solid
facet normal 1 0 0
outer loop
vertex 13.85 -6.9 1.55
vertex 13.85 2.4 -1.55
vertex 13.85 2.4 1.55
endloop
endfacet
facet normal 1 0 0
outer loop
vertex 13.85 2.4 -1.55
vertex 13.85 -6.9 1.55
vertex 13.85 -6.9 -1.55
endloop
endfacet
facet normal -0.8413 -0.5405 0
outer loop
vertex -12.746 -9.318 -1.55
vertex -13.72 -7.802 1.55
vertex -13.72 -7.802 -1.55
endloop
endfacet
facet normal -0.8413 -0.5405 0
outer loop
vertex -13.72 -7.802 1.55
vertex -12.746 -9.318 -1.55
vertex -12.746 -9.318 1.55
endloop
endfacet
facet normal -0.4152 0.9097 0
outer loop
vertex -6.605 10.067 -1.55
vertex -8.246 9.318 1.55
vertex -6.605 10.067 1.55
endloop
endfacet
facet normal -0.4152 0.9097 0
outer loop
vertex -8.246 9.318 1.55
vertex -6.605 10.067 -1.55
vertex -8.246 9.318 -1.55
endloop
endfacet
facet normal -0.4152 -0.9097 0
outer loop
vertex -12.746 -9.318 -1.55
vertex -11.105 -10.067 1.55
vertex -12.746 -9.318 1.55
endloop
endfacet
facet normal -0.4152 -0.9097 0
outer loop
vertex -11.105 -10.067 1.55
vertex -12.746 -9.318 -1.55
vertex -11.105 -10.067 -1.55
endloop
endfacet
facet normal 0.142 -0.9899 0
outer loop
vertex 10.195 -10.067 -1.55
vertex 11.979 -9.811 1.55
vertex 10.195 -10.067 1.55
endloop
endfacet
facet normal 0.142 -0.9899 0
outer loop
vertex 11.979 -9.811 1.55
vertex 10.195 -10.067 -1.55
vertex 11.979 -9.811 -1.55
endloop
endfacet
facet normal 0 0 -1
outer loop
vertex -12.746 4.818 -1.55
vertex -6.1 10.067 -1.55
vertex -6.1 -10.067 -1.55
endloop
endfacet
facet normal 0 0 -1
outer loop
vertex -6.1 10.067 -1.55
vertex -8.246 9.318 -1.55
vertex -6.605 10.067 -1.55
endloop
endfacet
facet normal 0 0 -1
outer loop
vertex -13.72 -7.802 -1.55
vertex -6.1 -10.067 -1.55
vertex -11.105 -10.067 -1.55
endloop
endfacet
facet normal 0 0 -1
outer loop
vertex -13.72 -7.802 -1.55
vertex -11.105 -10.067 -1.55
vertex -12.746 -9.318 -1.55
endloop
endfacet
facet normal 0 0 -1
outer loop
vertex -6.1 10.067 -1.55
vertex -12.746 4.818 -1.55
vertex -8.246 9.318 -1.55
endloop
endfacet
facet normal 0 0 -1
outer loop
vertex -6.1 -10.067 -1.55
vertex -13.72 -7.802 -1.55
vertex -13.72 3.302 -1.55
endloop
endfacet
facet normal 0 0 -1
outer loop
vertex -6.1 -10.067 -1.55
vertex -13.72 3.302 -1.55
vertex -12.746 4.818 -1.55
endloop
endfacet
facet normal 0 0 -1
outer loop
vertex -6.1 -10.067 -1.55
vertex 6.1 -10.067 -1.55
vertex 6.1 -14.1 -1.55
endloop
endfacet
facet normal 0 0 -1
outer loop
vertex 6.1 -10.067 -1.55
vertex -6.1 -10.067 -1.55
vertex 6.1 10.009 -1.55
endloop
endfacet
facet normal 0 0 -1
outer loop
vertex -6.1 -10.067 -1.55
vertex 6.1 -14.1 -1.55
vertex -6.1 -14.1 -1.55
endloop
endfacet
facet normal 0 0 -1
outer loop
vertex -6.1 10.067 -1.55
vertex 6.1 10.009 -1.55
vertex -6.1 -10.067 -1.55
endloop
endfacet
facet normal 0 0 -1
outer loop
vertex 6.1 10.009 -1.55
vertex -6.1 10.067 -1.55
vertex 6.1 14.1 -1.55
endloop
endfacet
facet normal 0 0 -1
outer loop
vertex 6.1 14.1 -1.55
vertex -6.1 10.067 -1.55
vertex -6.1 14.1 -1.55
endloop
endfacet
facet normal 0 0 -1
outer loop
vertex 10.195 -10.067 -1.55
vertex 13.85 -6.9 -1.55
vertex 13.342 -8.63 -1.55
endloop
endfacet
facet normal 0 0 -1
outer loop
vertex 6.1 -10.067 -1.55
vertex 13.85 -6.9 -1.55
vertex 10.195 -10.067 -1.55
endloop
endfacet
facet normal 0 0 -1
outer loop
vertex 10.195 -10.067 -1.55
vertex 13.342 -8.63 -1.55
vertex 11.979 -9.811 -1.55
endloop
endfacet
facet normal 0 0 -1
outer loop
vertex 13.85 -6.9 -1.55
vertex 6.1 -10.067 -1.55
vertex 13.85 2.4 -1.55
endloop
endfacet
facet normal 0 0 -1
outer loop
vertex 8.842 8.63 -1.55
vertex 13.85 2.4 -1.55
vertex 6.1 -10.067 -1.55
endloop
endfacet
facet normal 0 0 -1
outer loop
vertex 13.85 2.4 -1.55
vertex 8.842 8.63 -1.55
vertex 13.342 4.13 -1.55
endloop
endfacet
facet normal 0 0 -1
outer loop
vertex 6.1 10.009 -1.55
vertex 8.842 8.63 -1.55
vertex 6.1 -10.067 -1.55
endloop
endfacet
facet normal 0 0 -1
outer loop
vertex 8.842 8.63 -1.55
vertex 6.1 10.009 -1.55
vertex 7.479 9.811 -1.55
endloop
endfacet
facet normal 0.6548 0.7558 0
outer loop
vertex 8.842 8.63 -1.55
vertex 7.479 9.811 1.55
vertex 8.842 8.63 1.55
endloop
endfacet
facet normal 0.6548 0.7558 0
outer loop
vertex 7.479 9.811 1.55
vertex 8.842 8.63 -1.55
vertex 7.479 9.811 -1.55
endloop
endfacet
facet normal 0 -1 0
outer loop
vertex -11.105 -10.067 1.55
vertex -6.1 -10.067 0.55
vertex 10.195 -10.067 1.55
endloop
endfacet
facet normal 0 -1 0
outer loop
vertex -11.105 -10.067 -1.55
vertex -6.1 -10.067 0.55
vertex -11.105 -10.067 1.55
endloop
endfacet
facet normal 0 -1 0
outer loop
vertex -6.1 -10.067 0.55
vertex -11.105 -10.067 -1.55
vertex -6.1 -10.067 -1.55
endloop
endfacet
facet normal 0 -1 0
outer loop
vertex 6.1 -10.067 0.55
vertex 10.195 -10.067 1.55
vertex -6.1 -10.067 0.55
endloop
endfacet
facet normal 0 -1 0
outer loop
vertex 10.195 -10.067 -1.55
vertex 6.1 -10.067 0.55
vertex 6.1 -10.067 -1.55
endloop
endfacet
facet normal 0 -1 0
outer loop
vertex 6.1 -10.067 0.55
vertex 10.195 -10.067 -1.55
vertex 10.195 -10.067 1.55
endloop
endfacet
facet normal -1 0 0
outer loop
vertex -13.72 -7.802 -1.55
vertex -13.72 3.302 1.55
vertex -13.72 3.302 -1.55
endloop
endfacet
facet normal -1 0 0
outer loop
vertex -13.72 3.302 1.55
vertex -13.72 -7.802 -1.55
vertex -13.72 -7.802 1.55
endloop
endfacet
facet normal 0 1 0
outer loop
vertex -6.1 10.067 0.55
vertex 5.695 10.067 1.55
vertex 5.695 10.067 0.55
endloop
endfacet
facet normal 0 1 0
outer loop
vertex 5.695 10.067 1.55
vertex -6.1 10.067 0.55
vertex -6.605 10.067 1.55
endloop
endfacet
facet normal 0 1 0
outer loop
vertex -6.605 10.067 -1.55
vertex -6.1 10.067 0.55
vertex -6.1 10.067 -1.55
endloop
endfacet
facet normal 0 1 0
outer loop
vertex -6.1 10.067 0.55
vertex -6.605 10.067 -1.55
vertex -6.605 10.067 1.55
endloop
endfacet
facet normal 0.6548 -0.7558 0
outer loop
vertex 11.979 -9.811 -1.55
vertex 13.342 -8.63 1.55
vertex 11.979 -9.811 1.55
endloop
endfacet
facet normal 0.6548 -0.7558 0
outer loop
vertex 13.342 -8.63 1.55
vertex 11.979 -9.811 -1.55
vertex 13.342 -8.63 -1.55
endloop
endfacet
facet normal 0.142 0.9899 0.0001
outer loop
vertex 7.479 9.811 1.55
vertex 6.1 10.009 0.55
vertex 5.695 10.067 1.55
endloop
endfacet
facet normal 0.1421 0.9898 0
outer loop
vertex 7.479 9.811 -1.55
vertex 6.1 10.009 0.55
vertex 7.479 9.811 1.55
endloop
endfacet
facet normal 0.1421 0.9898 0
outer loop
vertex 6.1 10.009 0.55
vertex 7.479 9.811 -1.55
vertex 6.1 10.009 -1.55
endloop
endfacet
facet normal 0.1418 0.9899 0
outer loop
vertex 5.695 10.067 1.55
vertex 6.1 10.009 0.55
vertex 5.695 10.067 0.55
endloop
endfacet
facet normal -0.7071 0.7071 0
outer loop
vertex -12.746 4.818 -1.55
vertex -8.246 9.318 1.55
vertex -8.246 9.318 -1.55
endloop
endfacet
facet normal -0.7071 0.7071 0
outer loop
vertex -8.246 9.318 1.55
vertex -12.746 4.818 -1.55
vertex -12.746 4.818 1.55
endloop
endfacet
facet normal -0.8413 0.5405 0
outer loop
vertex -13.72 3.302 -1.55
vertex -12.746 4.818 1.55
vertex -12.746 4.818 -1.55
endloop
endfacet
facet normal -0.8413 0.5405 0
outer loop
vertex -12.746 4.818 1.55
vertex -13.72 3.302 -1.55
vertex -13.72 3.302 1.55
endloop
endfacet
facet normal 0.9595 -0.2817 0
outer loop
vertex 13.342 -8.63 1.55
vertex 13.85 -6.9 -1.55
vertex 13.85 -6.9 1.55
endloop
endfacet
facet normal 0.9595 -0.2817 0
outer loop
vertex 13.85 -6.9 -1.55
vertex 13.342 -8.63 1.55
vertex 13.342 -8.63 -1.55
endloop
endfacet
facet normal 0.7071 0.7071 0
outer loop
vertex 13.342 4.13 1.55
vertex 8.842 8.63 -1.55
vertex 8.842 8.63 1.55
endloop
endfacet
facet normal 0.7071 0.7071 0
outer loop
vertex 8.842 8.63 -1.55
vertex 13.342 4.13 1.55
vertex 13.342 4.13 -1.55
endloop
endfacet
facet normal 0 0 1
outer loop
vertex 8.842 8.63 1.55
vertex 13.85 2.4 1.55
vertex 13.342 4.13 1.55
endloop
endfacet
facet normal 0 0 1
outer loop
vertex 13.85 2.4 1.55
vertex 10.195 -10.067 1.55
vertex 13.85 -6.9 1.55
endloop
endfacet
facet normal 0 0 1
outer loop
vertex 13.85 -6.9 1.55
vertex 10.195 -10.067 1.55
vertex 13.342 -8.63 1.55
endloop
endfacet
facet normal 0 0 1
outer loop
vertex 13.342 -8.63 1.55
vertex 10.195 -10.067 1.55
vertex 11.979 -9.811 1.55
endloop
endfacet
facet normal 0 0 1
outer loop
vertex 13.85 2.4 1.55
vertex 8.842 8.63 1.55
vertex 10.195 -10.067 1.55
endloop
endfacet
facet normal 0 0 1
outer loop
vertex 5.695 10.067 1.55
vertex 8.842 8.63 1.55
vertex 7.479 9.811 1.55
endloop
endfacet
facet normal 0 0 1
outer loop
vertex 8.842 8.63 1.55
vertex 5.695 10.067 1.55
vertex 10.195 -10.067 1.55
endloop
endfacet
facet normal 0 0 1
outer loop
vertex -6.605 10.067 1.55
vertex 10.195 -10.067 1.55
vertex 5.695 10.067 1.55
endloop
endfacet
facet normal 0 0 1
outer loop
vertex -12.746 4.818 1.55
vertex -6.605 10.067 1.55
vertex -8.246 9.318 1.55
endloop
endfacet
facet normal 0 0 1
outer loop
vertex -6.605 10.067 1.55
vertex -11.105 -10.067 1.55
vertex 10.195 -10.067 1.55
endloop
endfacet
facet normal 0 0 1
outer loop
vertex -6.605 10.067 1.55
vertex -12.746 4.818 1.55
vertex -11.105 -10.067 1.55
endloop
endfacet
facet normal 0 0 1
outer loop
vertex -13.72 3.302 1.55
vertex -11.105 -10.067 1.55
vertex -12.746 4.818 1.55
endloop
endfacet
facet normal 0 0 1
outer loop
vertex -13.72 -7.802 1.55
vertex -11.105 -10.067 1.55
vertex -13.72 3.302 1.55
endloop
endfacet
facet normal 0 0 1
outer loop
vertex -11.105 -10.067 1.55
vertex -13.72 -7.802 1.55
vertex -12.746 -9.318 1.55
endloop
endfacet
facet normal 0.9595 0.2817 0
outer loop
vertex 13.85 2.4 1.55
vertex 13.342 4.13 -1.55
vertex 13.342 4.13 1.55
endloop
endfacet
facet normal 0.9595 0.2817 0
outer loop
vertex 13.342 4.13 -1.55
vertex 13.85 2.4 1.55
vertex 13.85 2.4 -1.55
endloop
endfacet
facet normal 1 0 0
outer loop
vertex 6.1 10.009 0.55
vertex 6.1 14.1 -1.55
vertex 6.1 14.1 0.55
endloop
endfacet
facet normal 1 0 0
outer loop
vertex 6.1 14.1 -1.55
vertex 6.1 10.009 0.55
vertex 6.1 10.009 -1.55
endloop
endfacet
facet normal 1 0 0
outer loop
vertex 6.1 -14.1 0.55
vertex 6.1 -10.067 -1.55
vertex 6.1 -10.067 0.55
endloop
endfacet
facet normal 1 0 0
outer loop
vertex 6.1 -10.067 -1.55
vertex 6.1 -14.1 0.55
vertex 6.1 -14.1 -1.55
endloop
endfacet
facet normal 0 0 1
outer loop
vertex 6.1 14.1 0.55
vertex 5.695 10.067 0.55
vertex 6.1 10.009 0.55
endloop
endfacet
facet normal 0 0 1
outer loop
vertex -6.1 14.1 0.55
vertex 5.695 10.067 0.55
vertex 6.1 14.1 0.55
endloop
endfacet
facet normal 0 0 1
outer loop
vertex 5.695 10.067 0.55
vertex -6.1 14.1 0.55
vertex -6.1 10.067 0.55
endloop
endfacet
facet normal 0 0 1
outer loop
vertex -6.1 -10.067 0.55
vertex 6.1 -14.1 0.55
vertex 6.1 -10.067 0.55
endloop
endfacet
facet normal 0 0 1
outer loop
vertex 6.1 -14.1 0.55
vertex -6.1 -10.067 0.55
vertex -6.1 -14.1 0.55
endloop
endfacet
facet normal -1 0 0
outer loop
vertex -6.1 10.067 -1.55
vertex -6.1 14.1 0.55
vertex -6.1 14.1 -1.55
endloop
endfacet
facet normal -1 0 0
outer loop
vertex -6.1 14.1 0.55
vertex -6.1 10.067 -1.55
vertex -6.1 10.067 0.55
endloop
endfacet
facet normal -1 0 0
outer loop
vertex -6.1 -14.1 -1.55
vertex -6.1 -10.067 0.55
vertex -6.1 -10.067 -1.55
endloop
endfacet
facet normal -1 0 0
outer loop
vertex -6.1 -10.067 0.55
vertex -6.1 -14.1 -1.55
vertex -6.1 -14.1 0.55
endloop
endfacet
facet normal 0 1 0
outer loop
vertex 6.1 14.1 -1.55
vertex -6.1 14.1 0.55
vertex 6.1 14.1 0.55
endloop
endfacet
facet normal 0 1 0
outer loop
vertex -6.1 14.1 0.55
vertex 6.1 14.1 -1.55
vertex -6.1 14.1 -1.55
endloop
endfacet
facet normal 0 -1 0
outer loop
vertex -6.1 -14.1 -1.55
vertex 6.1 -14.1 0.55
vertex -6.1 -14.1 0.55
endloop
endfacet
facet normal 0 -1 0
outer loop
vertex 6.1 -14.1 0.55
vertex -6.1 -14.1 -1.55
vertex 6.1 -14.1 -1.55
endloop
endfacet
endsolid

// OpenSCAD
// file: ../../lib/connector/connector_euro.scad
//connector_GSD4(3,0.1);
//connector_Schurter_6100_4(3,0.1);

module connector_Schurter_6100_4(depth,clear)
{
    conn_height = 20;
    conn_width = 27.5;
    conn_radius = 3;
    conn_corner = 4.5;
    lock_width = 12;
    lock_height = conn_height+8;
    lock_depth = 1;

    connector_euro(conn_height,conn_width,depth,conn_radius,conn_corner,clear);
    translate([0, 0, lock_depth-depth/2])
        connector_euro_lock(lock_width,lock_height,depth-lock_depth,clear);
}

module connector_GSD4(depth,clear)
{
    conn_height = 24.5;
    conn_width = 32.5;
    conn_radius = 3;
    conn_corner = 5;
    hole_width = 40;
    hole_diameter = 3.0+clear;
    conn_hole_distance = (hole_width-conn_width)/2;

    connector_euro(conn_height,conn_width,depth,conn_radius,conn_corner,clear);
    translate([-conn_width/2-conn_hole_distance,0,0])
        connector_euro_hole(hole_diameter,depth,clear);
    translate([conn_width/2+conn_hole_distance,0,0])
        connector_euro_hole(hole_diameter,depth,clear);
}

module connector_euro_hole(diameter,depth,clear)
{
    radius = diameter/2 + clear;

    cylinder(r=radius, h=depth,center=true);
}

module connector_euro_lock(width,height,depth,clear)
{
    height = height+2*clear;
    width = width+2*clear;
    depth = depth+clear;

    cube([width, height, depth],center=true);
}

module connector_euro(height,width,depth,radius,corner,clear)
{
    height = height+2*clear;
    width = width+2*clear;
    radius = radius+2*clear;
    depth = depth+clear;
    height_axis = height/2;
    width_axis = width/2;

    hull(){
        translate([radius-width_axis, radius-height_axis, 0])
            cylinder(r=radius, h=depth,center=true);
        translate([width_axis-radius, radius-height_axis, 0])
            cylinder(r=radius, h=depth,center=true);
        translate([radius-width_axis, height_axis-radius-corner, 0])
            cylinder(r=radius, h=depth,center=true);
        translate([radius+corner-width_axis, height_axis-radius, 0])
            cylinder(r=radius, h=depth,center=true);
        translate([width_axis-radius, height_axis-radius-corner, 0])
            cylinder(r=radius, h=depth,center=true);
        translate([width_axis-radius-corner, height_axis-radius, 0])
            cylinder(r=radius, h=depth,center=true);
    }
}
// main file
include <../../lib/connector/connector_euro.scad>;

connector_Schurter_6100_4(3,0.1);
